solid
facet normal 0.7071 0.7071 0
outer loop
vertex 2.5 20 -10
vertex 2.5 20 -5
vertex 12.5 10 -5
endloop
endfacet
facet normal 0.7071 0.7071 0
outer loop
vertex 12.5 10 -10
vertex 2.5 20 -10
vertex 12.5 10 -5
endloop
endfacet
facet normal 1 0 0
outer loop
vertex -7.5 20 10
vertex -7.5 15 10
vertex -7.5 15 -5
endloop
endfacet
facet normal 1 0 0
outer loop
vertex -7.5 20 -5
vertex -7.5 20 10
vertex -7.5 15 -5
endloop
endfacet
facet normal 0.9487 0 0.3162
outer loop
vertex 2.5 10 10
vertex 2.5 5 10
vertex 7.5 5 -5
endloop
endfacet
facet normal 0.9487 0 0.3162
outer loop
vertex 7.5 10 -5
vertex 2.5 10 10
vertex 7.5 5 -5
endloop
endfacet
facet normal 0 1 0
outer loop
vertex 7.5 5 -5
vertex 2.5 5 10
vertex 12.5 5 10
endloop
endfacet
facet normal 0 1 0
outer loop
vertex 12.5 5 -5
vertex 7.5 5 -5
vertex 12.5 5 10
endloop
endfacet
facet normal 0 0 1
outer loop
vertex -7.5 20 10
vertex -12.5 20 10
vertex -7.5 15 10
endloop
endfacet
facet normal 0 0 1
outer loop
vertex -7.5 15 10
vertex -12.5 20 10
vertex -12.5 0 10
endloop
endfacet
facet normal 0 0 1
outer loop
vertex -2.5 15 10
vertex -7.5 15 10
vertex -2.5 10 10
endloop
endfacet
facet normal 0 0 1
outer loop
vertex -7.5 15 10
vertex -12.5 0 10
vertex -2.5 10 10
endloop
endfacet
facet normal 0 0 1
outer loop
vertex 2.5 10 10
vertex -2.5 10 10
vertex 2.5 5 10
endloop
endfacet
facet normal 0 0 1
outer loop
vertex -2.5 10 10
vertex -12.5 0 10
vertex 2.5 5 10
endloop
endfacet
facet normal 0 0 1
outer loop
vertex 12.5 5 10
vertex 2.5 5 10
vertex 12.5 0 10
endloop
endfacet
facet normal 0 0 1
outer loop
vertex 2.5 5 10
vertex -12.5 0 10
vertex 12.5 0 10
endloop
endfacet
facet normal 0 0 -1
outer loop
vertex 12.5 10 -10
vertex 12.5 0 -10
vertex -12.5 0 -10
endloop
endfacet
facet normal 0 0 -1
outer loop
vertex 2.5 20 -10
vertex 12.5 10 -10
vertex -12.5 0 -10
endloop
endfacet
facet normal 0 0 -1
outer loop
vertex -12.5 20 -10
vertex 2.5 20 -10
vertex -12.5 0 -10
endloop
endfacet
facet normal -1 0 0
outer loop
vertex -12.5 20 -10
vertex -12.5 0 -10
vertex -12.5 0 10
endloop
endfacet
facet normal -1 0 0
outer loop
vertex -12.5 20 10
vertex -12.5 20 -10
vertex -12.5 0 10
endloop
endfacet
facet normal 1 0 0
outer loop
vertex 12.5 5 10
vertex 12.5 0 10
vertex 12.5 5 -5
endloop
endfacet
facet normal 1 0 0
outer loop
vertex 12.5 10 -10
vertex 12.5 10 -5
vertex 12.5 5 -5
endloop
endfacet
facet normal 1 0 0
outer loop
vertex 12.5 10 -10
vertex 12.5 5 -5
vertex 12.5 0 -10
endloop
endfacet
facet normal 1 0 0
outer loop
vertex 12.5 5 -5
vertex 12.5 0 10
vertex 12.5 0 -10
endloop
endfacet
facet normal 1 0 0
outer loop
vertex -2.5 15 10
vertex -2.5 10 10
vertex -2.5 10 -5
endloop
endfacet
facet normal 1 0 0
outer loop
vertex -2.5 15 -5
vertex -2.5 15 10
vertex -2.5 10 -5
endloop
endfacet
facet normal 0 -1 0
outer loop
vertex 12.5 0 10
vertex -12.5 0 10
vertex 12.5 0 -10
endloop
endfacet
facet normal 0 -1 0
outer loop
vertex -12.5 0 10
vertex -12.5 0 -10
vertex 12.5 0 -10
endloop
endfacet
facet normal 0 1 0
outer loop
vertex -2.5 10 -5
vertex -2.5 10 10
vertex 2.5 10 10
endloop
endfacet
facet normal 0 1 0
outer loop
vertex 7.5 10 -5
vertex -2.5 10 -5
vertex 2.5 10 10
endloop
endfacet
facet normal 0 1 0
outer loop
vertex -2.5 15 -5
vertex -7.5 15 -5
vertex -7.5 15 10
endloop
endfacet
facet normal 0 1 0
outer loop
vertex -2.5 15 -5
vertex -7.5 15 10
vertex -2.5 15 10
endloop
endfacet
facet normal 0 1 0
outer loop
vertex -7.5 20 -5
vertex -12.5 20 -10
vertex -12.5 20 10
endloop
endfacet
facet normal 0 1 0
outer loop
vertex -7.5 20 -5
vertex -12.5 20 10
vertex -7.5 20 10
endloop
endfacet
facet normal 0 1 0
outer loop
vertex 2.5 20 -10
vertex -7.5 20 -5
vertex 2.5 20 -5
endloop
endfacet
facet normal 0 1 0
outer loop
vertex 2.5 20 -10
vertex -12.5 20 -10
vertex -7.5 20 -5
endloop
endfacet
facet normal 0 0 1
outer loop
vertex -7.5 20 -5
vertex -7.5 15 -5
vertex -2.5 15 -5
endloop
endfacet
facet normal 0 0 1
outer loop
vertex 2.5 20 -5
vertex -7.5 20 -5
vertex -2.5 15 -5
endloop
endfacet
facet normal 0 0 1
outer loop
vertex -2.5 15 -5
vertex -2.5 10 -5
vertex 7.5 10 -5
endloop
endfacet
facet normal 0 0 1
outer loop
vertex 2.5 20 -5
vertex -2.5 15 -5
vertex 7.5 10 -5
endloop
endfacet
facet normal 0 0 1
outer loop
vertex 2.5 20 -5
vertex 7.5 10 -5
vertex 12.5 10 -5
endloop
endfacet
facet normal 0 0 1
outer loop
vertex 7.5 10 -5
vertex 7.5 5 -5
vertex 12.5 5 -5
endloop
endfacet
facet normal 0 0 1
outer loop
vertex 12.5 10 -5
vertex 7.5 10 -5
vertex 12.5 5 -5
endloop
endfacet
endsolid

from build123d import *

# Parameters (mm, degrees)
SKETCH_1_W          = 25
SKETCH_1_H          = 20
EXTRUDE_1_DEPTH     = 5
EXTRUDE_2_DEPTH     = 10
SKETCH_1_4_W        = 5
SKETCH_1_4_H        = 15
EXTRUDE_3_DEPTH     = 15
EXTRUDE_4_DEPTH     = 20
CUT_EXTRUDE_1_DEPTH = 20


with BuildPart() as part:
    # 草圖1 → 填料-伸長1 (new body)
    with BuildSketch(Plane(origin=(0, 0, 0), x_dir=(1, 0, 0), z_dir=(0, 1, 0))):
        Rectangle(SKETCH_1_W, SKETCH_1_H)
    extrude(amount=EXTRUDE_1_DEPTH)

    # 草圖1<3> → 填料-伸長2 (add)
    with BuildSketch(Plane(origin=(0, 0, 0), x_dir=(1, 0, 0), z_dir=(0, 1, 0))):
        Polygon((2.5, -10), (7.5, 5), (-2.5, 5), (-2.5, -10), align=None)
    extrude(amount=EXTRUDE_2_DEPTH)

    # 草圖1<4> → 填料-伸長3 (add)
    with BuildSketch(Plane(origin=(0, 0, 0), x_dir=(1, 0, 0), z_dir=(0, 1, 0))):
        with Locations((-5, -2.5)):
            Rectangle(SKETCH_1_4_W, SKETCH_1_4_H)
    extrude(amount=EXTRUDE_3_DEPTH)

    # 草圖1<5> → 填料-伸長4 (add)
    with BuildSketch(Plane(origin=(0, 0, 0), x_dir=(1, 0, 0), z_dir=(0, 1, 0))):
        Polygon((7.5, 5), (12.5, 5), (12.5, 10), (-12.5, 10), (-12.5, -10), (-7.5, -10), (-7.5, 5), (-2.5, 5), align=None)
    extrude(amount=EXTRUDE_4_DEPTH)

    # 草圖2 → 除料-伸長1 (cut)
    with BuildSketch(Plane.XY.offset(-5)):
        Polygon((12.5, 20), (2.5, 20), (12.5, 10), align=None)
    extrude(amount=-CUT_EXTRUDE_1_DEPTH, mode=Mode.SUBTRACT)


solid = part.part
